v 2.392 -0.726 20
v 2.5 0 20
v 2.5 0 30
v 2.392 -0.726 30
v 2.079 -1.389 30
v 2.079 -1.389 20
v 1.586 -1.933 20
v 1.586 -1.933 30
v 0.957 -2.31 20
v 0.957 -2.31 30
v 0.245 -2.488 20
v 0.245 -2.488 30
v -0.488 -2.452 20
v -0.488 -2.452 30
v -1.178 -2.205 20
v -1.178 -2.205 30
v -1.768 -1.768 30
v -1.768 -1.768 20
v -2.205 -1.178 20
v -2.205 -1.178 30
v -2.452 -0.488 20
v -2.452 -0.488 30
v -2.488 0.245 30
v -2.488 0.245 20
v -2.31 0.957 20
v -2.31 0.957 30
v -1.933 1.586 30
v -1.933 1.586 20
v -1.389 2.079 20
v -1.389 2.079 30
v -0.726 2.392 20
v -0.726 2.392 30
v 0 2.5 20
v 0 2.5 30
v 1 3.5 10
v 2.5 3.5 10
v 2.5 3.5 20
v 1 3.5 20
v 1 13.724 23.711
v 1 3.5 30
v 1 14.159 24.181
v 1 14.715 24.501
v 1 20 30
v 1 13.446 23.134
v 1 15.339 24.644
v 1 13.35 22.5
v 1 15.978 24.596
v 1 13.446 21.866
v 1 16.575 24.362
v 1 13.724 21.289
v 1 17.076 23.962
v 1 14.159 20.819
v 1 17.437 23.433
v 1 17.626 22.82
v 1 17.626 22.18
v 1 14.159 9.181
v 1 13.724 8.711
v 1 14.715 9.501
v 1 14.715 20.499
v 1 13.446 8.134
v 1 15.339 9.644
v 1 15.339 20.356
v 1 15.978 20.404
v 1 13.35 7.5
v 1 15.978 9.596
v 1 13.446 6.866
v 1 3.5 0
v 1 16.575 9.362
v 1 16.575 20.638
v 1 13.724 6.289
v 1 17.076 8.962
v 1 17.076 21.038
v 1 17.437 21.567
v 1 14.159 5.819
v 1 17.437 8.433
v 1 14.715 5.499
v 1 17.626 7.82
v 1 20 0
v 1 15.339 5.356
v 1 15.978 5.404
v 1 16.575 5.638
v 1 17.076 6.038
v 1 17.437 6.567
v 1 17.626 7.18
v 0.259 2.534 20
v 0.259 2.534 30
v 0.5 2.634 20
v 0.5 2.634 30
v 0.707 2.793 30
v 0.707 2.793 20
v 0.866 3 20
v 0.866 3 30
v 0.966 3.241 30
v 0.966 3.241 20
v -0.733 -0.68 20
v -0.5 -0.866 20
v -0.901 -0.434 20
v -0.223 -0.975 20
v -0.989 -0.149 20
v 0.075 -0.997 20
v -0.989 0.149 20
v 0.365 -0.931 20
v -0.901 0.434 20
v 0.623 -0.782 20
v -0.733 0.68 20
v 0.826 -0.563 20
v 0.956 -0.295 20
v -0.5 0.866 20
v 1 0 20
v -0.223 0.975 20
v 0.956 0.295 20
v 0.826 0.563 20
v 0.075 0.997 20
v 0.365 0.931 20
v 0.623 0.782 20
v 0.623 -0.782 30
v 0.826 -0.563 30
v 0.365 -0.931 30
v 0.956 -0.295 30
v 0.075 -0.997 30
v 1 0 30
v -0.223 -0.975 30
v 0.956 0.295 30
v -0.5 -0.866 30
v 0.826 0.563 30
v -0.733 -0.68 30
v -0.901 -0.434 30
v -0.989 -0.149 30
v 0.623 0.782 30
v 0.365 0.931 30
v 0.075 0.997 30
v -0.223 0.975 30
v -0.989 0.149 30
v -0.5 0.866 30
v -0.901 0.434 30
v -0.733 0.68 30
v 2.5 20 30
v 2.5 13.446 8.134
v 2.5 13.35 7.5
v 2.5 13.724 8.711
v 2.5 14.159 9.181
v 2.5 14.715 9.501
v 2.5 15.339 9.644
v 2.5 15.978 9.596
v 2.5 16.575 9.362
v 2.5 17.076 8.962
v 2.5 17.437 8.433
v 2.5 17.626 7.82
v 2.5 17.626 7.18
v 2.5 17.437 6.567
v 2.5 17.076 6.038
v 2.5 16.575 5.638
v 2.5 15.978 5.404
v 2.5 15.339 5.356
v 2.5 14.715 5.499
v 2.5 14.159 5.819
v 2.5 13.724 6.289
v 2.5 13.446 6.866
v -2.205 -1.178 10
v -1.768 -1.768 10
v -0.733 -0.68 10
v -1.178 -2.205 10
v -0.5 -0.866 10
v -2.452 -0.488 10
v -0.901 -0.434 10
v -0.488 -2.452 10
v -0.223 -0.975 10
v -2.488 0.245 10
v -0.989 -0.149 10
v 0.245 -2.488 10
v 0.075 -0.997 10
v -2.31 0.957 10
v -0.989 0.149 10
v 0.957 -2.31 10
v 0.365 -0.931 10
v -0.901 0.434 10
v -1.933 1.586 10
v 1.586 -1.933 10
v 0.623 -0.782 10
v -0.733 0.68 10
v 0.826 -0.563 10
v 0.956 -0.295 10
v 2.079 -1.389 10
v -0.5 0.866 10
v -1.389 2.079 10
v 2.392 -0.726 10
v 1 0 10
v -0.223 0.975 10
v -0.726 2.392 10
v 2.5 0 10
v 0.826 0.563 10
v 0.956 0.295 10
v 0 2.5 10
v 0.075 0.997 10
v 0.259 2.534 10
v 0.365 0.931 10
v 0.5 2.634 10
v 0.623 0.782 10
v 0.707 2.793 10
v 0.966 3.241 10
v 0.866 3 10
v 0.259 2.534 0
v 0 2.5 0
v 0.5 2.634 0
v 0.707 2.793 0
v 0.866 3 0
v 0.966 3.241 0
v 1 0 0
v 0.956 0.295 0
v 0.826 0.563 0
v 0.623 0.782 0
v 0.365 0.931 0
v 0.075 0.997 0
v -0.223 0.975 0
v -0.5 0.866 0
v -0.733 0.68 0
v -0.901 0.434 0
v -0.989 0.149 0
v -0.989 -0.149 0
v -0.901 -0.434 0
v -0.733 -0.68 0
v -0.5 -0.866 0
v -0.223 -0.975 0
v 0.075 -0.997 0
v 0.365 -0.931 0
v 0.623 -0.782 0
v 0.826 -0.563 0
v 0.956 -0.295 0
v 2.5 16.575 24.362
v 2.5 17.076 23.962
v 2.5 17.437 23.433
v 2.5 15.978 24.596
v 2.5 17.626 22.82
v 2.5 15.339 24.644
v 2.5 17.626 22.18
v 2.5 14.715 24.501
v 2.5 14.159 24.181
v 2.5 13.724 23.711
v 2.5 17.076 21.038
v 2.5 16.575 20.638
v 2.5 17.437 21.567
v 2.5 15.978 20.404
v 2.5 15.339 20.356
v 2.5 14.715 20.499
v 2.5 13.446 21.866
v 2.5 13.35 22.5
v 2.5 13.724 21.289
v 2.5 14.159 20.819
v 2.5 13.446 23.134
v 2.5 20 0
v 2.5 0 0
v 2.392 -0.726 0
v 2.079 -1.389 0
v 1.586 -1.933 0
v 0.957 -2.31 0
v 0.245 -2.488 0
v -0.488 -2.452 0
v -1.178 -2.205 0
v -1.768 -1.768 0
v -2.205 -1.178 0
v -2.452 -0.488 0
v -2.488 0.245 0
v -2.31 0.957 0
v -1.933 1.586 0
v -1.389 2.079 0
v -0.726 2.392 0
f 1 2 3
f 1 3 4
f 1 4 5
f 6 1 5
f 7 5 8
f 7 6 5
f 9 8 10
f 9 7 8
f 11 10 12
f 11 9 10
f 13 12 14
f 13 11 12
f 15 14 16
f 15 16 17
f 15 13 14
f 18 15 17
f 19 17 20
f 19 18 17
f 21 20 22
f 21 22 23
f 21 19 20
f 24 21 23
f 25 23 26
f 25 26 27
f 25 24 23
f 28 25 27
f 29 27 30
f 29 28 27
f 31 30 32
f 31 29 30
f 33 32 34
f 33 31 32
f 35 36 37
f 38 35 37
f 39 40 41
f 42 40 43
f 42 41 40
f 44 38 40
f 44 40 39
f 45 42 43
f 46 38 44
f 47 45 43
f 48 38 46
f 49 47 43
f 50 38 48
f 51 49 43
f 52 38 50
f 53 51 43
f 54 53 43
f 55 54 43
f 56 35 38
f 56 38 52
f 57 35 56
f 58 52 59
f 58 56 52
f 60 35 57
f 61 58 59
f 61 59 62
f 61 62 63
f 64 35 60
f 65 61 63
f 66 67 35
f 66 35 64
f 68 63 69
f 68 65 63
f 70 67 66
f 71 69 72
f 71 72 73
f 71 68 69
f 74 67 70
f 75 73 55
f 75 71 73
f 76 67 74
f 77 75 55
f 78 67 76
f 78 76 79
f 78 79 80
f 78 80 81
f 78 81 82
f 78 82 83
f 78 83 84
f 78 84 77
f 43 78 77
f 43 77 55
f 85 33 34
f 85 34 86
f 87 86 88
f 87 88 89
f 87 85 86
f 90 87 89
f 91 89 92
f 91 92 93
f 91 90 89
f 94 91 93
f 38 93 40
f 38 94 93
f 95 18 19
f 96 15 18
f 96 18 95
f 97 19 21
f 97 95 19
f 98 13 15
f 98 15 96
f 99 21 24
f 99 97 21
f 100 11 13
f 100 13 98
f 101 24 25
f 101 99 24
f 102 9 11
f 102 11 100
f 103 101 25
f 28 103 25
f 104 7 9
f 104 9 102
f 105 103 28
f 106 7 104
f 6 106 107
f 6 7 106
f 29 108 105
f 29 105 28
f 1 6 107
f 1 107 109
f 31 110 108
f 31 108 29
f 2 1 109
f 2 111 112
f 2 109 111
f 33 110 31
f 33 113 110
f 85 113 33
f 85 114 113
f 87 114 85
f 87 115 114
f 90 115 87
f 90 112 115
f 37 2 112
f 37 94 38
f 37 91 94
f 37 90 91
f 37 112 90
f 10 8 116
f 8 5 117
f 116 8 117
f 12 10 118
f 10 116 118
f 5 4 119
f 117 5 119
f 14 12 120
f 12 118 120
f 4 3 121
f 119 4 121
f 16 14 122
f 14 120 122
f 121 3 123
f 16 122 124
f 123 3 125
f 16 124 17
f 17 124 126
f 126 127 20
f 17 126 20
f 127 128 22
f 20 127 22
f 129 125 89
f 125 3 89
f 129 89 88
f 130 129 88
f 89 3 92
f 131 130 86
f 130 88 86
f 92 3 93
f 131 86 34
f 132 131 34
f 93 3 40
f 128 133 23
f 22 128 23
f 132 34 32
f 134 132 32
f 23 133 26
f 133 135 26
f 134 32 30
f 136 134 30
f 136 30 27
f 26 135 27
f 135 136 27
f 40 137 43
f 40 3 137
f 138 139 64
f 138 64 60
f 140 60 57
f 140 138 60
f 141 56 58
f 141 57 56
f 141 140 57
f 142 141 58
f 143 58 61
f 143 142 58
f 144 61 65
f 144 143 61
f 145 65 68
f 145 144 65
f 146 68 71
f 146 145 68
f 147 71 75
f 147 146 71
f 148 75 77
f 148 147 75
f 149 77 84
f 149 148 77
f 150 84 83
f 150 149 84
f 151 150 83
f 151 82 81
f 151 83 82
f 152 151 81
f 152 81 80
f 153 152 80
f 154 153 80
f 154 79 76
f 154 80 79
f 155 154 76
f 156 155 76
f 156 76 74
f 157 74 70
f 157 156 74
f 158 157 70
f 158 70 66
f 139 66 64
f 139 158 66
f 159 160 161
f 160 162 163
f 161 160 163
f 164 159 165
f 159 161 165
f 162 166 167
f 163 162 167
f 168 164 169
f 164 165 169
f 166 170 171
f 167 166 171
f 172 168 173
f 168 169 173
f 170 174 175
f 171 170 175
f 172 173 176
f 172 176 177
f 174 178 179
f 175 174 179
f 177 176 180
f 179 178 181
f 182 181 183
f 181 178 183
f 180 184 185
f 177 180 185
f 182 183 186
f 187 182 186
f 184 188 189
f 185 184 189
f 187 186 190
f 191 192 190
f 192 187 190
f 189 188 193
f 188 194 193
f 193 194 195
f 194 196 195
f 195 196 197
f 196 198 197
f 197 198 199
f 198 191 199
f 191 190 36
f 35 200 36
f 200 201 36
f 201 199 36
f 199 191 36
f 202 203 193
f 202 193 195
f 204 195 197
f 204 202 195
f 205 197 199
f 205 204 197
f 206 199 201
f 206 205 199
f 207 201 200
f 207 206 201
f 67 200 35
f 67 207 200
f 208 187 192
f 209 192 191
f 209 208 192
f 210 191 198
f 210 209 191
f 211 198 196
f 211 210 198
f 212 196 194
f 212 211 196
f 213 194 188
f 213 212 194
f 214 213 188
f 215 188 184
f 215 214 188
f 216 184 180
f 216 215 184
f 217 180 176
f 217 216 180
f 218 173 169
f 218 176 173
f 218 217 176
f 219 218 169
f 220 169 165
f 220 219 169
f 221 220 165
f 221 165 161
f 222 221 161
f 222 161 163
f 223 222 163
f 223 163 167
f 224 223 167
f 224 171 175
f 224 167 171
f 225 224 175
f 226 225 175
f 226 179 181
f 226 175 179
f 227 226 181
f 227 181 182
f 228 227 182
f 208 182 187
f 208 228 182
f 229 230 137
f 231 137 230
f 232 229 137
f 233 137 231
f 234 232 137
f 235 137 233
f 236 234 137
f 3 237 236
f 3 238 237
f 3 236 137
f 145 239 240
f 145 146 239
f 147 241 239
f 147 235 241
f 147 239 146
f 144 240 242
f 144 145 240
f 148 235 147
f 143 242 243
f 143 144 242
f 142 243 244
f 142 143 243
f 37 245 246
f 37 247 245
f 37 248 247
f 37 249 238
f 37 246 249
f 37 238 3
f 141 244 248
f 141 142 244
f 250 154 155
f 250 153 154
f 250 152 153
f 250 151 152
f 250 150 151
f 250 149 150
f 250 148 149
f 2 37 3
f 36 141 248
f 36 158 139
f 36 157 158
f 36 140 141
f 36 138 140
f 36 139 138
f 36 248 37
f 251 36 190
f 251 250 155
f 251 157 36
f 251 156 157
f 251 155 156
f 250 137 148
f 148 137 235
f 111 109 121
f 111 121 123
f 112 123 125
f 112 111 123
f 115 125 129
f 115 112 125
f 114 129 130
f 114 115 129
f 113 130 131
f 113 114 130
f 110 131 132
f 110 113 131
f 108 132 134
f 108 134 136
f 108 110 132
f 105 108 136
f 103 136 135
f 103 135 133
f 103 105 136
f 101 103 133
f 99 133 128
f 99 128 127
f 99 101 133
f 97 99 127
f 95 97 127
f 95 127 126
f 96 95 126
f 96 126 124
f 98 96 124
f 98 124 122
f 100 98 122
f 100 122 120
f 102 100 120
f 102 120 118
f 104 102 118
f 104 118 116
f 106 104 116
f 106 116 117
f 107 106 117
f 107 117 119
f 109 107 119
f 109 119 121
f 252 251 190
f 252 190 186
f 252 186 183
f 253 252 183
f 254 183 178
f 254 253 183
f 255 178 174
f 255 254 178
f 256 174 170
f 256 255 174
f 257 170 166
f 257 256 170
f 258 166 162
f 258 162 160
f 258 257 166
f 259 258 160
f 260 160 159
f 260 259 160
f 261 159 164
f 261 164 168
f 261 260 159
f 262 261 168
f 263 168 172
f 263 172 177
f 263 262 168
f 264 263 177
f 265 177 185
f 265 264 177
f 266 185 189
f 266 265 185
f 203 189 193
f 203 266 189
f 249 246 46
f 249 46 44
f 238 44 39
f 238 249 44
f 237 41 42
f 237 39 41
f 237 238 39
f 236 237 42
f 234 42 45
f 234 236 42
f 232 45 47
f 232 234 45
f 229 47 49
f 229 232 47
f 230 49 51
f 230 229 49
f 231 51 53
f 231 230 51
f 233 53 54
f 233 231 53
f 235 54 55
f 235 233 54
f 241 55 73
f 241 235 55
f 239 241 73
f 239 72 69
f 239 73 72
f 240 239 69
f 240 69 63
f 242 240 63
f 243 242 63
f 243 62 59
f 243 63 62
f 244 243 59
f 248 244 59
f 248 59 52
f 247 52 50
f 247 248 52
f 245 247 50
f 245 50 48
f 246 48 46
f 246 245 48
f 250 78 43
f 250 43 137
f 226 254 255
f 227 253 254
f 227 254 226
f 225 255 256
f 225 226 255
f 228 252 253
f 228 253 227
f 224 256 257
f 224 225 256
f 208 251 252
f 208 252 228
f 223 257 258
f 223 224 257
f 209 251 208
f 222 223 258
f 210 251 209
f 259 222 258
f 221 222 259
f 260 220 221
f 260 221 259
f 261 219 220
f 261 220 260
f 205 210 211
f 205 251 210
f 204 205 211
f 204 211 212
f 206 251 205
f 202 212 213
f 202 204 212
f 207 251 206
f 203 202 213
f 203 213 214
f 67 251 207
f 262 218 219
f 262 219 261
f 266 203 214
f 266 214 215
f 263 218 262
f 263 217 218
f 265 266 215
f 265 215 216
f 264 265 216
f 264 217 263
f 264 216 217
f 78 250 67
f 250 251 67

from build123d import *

# Parameters (mm, degrees)
SKETCH2_R               = 1
BOSS_EXTRUDE2_DEPTH     = 30
CUT_EXTRUDE1_DEPTH      = 37.224991373
CUT_EXTRUDE1_DEPTH_BACK = 37.224991373
SKETCH3_R               = 2.15
SKETCH3_W               = 10
SKETCH3_H               = 7


with BuildPart() as part:
    # Sketch2 → Boss-Extrude2 (new body)
    with BuildSketch(Plane.XY):
        with BuildLine():
            Line((1, 3.5), (1, 20))
            Line((1, 20), (2.5, 20))
            Line((2.5, 20), (2.5, 0))
            ThreePointArc((2.5, 0), (-1.767766953, -1.767766953), (0, 2.5))
            ThreePointArc((0, 2.5), (0.707106781, 2.792893219), (1, 3.5))
        make_face()
        Circle(SKETCH2_R, mode=Mode.SUBTRACT)
    extrude(amount=BOSS_EXTRUDE2_DEPTH)

    # Sketch3 → Cut-Extrude1 (cut, two sides: drawn at the far end of the back side and taken through both)
    with BuildSketch(Plane.ZY.offset(-1).offset(-CUT_EXTRUDE1_DEPTH_BACK)):
        with Locations(Location((7.5, 15.5, 0), (0, 0, 270))):
            Circle(SKETCH3_R)
        with Locations(Location((22.5, 15.5, 0), (0, 0, 270))):
            Circle(SKETCH3_R)
        with Locations((15, 0)):
            Rectangle(SKETCH3_W, SKETCH3_H)
    extrude(amount=CUT_EXTRUDE1_DEPTH + CUT_EXTRUDE1_DEPTH_BACK, mode=Mode.SUBTRACT)


solid = part.part
